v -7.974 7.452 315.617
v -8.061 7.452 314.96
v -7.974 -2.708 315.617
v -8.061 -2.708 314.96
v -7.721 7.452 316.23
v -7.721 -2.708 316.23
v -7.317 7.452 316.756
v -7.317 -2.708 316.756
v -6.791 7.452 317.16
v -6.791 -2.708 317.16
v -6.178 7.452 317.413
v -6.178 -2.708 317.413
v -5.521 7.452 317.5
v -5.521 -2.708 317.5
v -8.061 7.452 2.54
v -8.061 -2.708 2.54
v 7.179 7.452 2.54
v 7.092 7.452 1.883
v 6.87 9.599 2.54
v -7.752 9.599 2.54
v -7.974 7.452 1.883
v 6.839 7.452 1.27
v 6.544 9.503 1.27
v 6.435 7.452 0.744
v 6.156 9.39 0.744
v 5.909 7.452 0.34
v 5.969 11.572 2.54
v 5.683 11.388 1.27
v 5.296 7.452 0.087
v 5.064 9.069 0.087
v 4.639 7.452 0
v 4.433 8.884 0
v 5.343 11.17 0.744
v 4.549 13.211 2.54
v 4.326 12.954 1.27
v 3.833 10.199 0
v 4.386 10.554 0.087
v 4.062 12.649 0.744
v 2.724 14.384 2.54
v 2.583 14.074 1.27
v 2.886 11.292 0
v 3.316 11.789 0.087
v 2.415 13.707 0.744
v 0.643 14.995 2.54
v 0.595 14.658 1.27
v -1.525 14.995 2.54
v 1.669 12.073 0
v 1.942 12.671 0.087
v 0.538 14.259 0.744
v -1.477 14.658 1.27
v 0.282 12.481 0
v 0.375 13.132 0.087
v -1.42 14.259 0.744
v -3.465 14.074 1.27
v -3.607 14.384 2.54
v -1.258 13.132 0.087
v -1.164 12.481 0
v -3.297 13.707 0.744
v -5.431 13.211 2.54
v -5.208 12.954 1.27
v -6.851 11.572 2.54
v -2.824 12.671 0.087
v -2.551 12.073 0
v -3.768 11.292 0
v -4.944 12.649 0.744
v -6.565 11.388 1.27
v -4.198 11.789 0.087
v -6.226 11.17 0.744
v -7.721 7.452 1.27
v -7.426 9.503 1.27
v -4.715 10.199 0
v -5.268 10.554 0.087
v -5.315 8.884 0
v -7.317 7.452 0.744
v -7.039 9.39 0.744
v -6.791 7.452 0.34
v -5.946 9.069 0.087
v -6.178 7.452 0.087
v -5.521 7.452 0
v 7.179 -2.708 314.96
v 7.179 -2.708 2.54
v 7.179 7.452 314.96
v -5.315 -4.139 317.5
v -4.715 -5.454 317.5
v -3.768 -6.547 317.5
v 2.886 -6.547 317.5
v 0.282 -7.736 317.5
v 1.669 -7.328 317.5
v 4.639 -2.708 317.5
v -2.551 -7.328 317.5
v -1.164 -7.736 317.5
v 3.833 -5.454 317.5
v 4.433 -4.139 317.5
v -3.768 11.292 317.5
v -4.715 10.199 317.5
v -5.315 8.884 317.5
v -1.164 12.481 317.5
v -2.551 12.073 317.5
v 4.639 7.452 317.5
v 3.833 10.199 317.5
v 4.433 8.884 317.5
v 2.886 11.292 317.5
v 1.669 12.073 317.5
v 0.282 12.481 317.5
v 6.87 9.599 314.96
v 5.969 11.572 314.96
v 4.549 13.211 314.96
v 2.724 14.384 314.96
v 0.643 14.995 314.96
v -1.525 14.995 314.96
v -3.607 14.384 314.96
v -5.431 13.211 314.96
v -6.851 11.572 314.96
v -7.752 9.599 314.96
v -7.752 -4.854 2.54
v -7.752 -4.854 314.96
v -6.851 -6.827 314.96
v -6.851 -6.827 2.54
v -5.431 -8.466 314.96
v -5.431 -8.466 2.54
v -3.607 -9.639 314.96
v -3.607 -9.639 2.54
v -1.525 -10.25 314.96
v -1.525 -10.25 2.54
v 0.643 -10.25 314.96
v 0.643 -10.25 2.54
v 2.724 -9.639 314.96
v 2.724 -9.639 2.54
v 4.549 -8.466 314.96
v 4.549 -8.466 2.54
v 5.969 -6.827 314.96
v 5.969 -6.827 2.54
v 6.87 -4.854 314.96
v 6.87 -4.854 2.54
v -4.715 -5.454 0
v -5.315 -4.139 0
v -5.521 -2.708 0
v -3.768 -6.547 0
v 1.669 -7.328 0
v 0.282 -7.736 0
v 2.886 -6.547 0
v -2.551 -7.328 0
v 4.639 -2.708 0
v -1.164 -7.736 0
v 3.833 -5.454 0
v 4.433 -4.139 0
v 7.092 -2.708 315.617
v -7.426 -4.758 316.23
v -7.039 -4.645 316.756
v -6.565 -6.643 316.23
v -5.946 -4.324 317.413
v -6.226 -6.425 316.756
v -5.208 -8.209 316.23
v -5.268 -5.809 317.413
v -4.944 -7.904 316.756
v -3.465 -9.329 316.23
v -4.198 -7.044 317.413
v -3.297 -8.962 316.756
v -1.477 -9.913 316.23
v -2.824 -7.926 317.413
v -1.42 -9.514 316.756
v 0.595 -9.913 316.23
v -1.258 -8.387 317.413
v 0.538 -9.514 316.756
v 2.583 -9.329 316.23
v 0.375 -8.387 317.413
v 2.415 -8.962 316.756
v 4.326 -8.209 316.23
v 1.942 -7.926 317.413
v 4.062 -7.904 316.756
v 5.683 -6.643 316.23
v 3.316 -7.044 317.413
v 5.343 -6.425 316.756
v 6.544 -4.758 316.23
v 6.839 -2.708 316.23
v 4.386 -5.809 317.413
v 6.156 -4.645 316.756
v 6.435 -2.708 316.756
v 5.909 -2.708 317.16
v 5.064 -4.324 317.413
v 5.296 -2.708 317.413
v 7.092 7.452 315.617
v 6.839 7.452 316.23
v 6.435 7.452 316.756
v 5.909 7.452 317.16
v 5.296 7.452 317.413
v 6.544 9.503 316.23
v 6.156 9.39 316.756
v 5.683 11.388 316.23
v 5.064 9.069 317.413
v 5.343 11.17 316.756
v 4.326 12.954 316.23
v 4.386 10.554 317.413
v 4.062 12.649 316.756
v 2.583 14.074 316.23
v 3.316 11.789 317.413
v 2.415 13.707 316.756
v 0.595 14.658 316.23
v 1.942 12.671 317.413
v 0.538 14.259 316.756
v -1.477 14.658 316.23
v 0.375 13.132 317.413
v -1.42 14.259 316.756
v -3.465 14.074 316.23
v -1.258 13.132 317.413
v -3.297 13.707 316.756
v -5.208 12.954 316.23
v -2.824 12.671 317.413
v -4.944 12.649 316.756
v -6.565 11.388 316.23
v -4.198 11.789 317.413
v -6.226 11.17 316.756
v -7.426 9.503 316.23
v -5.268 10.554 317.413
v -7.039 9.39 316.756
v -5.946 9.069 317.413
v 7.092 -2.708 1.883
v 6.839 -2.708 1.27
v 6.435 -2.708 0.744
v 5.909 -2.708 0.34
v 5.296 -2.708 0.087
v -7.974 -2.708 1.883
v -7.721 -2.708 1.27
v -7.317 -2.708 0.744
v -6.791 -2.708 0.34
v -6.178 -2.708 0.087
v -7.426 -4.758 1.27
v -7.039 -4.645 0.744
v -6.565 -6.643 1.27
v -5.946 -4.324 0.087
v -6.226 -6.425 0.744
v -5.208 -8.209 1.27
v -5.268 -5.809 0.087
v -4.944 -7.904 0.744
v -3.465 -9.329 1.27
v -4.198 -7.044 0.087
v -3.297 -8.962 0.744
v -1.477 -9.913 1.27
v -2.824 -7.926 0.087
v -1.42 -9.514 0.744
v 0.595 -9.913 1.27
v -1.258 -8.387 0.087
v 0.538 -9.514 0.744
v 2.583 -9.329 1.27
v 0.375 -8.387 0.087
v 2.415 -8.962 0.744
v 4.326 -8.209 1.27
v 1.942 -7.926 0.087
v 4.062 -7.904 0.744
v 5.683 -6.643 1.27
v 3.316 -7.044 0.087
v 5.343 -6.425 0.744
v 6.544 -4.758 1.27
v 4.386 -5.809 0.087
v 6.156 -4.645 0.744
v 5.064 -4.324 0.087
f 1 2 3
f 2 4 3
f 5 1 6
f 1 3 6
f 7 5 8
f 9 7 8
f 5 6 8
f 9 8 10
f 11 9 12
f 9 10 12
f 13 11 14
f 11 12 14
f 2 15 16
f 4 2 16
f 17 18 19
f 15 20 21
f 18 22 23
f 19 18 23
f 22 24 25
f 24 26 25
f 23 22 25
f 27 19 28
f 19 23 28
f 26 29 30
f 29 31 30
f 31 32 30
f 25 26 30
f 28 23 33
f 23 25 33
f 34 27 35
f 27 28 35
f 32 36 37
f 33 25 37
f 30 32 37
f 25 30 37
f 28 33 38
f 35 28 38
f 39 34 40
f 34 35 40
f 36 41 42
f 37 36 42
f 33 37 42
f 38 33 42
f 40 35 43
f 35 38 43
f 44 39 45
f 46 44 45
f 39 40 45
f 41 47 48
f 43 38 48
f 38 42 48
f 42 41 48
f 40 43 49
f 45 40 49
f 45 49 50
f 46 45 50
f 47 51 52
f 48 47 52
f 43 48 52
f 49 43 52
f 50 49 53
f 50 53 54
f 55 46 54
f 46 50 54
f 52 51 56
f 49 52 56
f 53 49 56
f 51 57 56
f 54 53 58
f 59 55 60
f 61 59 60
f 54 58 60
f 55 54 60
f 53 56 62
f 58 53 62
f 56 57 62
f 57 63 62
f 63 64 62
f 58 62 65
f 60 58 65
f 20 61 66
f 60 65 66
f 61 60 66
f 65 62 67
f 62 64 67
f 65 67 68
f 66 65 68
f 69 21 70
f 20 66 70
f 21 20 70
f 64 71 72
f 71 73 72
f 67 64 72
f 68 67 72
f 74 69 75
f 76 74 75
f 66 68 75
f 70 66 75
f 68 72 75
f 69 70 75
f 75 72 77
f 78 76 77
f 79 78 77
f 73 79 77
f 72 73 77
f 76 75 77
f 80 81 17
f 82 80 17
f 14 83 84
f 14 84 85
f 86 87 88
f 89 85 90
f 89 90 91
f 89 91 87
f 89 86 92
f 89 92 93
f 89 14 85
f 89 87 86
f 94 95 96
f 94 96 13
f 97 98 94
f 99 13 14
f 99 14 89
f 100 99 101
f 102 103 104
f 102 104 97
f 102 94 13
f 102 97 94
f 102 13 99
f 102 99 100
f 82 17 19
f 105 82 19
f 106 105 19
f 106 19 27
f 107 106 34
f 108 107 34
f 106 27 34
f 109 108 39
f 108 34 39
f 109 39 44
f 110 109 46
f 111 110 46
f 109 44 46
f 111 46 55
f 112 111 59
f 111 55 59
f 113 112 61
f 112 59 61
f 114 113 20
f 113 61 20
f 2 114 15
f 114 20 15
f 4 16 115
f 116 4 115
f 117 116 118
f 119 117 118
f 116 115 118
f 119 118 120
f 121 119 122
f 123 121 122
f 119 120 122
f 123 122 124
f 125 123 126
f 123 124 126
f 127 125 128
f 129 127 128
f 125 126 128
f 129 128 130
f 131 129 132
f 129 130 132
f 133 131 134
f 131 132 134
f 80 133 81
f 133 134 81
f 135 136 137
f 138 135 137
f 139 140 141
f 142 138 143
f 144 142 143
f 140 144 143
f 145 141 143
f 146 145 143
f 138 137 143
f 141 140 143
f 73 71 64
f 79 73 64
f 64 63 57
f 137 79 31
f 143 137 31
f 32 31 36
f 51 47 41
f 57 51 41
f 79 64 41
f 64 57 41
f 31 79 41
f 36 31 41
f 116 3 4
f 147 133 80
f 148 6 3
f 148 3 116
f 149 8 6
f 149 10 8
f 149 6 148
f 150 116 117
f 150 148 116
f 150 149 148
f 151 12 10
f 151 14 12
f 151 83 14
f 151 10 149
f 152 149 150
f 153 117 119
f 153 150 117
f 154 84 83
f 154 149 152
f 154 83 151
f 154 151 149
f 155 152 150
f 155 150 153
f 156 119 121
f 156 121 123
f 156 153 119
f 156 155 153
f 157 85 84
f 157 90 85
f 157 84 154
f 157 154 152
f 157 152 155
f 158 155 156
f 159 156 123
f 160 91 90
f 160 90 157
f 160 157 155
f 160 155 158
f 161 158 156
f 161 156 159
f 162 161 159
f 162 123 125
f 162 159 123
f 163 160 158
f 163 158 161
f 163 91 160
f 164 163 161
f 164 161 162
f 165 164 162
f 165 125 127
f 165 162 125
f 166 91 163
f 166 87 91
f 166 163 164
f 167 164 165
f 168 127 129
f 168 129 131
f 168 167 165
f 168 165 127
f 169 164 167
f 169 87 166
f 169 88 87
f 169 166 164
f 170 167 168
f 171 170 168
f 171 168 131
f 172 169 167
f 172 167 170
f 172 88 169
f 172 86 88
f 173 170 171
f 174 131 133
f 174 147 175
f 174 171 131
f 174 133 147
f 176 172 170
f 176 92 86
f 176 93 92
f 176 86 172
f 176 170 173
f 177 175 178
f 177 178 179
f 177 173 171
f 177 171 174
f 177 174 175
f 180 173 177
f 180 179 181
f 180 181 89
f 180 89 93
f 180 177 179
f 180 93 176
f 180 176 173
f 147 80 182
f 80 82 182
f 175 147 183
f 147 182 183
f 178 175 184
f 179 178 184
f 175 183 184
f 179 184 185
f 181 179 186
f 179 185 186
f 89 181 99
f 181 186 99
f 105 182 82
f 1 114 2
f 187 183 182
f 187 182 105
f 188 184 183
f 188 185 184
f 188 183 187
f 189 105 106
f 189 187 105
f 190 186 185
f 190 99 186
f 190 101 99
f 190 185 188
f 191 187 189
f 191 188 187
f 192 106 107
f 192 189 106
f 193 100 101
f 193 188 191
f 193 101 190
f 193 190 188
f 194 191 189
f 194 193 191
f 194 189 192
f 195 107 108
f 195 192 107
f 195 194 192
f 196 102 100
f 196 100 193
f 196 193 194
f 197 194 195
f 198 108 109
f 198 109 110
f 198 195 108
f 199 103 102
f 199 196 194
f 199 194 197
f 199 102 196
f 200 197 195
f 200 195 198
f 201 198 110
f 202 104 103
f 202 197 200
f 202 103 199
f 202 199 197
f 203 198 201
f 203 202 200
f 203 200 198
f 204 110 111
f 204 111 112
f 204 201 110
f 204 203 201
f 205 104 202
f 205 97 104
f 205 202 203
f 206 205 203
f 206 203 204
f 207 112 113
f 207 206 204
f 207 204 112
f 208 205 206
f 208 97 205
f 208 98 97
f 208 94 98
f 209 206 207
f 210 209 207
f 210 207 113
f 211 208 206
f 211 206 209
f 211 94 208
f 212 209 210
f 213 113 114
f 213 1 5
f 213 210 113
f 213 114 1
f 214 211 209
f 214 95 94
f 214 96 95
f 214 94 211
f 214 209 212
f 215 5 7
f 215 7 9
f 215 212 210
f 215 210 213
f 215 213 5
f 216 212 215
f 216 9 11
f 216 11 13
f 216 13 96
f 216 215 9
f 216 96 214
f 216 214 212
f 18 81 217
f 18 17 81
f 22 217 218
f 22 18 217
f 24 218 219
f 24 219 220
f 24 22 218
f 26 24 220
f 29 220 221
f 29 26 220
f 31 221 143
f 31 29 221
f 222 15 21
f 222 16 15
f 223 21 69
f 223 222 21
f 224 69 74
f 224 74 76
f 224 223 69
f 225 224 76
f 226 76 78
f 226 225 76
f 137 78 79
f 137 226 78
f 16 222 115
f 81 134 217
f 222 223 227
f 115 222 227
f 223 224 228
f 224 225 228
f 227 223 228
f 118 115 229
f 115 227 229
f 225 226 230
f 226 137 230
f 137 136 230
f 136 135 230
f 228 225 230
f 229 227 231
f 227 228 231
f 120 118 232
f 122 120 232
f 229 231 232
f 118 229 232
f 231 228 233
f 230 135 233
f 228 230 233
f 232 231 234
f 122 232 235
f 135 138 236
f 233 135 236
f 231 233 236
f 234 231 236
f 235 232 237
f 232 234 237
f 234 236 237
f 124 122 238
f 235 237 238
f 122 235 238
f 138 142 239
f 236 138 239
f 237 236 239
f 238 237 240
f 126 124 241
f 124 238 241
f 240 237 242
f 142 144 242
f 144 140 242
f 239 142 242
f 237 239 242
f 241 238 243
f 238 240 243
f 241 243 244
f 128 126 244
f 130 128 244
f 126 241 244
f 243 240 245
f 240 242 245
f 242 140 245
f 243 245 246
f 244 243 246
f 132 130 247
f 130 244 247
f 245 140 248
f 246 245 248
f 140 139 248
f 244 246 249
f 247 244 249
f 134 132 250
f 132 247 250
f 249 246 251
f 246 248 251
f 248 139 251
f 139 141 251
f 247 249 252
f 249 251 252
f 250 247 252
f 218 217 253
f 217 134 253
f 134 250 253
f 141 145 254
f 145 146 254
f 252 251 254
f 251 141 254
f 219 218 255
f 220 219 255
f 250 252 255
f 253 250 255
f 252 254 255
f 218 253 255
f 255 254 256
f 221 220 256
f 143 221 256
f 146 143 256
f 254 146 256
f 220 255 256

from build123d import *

# Parameters (mm, degrees)
F1_DEPTH = 317.5
F2_R     = 2.54
F3_R     = 2.54


with BuildPart() as f1:
    # F0 (on Top) → F1 (new body)
    with BuildSketch(Plane.XY):
        with BuildLine():
            Line((-8.061039, 7.452499), (-8.061039, 0))
            Line((-8.061039, 0), (-8.061039, -2.707501))
            ThreePointArc((-8.061039, -2.707501), (-0.441039, -10.327501), (7.178961, -2.707501))
            Line((7.178961, -2.707501), (7.178961, 0))
            Line((7.178961, 0), (7.178961, 7.452499))
            ThreePointArc((7.178961, 7.452499), (-0.441039, 15.072499), (-8.061039, 7.452499))
        make_face()
    extrude(amount=F1_DEPTH)

    # F2
    f2_edges = [f1.edges().sort_by_distance(p)[0] for p in [
        (-0.441039, 15.072499, 317.5),
        (7.178961, 2.372499, 317.5),
        (-0.441039, -10.327501, 317.5),
        (-8.061039, 2.372499, 317.5),
    ]]
    fillet(f2_edges, radius=F2_R)

    # F3
    f3_edges = [f1.edges().sort_by_distance(p)[0] for p in [
        (-0.441039, 15.072499, 0),
        (-0.441039, -10.327501, 0),
        (7.178961, 2.372499, 0),
        (-8.061039, 2.372499, 0),
    ]]
    fillet(f3_edges, radius=F3_R)


solid = f1.part
